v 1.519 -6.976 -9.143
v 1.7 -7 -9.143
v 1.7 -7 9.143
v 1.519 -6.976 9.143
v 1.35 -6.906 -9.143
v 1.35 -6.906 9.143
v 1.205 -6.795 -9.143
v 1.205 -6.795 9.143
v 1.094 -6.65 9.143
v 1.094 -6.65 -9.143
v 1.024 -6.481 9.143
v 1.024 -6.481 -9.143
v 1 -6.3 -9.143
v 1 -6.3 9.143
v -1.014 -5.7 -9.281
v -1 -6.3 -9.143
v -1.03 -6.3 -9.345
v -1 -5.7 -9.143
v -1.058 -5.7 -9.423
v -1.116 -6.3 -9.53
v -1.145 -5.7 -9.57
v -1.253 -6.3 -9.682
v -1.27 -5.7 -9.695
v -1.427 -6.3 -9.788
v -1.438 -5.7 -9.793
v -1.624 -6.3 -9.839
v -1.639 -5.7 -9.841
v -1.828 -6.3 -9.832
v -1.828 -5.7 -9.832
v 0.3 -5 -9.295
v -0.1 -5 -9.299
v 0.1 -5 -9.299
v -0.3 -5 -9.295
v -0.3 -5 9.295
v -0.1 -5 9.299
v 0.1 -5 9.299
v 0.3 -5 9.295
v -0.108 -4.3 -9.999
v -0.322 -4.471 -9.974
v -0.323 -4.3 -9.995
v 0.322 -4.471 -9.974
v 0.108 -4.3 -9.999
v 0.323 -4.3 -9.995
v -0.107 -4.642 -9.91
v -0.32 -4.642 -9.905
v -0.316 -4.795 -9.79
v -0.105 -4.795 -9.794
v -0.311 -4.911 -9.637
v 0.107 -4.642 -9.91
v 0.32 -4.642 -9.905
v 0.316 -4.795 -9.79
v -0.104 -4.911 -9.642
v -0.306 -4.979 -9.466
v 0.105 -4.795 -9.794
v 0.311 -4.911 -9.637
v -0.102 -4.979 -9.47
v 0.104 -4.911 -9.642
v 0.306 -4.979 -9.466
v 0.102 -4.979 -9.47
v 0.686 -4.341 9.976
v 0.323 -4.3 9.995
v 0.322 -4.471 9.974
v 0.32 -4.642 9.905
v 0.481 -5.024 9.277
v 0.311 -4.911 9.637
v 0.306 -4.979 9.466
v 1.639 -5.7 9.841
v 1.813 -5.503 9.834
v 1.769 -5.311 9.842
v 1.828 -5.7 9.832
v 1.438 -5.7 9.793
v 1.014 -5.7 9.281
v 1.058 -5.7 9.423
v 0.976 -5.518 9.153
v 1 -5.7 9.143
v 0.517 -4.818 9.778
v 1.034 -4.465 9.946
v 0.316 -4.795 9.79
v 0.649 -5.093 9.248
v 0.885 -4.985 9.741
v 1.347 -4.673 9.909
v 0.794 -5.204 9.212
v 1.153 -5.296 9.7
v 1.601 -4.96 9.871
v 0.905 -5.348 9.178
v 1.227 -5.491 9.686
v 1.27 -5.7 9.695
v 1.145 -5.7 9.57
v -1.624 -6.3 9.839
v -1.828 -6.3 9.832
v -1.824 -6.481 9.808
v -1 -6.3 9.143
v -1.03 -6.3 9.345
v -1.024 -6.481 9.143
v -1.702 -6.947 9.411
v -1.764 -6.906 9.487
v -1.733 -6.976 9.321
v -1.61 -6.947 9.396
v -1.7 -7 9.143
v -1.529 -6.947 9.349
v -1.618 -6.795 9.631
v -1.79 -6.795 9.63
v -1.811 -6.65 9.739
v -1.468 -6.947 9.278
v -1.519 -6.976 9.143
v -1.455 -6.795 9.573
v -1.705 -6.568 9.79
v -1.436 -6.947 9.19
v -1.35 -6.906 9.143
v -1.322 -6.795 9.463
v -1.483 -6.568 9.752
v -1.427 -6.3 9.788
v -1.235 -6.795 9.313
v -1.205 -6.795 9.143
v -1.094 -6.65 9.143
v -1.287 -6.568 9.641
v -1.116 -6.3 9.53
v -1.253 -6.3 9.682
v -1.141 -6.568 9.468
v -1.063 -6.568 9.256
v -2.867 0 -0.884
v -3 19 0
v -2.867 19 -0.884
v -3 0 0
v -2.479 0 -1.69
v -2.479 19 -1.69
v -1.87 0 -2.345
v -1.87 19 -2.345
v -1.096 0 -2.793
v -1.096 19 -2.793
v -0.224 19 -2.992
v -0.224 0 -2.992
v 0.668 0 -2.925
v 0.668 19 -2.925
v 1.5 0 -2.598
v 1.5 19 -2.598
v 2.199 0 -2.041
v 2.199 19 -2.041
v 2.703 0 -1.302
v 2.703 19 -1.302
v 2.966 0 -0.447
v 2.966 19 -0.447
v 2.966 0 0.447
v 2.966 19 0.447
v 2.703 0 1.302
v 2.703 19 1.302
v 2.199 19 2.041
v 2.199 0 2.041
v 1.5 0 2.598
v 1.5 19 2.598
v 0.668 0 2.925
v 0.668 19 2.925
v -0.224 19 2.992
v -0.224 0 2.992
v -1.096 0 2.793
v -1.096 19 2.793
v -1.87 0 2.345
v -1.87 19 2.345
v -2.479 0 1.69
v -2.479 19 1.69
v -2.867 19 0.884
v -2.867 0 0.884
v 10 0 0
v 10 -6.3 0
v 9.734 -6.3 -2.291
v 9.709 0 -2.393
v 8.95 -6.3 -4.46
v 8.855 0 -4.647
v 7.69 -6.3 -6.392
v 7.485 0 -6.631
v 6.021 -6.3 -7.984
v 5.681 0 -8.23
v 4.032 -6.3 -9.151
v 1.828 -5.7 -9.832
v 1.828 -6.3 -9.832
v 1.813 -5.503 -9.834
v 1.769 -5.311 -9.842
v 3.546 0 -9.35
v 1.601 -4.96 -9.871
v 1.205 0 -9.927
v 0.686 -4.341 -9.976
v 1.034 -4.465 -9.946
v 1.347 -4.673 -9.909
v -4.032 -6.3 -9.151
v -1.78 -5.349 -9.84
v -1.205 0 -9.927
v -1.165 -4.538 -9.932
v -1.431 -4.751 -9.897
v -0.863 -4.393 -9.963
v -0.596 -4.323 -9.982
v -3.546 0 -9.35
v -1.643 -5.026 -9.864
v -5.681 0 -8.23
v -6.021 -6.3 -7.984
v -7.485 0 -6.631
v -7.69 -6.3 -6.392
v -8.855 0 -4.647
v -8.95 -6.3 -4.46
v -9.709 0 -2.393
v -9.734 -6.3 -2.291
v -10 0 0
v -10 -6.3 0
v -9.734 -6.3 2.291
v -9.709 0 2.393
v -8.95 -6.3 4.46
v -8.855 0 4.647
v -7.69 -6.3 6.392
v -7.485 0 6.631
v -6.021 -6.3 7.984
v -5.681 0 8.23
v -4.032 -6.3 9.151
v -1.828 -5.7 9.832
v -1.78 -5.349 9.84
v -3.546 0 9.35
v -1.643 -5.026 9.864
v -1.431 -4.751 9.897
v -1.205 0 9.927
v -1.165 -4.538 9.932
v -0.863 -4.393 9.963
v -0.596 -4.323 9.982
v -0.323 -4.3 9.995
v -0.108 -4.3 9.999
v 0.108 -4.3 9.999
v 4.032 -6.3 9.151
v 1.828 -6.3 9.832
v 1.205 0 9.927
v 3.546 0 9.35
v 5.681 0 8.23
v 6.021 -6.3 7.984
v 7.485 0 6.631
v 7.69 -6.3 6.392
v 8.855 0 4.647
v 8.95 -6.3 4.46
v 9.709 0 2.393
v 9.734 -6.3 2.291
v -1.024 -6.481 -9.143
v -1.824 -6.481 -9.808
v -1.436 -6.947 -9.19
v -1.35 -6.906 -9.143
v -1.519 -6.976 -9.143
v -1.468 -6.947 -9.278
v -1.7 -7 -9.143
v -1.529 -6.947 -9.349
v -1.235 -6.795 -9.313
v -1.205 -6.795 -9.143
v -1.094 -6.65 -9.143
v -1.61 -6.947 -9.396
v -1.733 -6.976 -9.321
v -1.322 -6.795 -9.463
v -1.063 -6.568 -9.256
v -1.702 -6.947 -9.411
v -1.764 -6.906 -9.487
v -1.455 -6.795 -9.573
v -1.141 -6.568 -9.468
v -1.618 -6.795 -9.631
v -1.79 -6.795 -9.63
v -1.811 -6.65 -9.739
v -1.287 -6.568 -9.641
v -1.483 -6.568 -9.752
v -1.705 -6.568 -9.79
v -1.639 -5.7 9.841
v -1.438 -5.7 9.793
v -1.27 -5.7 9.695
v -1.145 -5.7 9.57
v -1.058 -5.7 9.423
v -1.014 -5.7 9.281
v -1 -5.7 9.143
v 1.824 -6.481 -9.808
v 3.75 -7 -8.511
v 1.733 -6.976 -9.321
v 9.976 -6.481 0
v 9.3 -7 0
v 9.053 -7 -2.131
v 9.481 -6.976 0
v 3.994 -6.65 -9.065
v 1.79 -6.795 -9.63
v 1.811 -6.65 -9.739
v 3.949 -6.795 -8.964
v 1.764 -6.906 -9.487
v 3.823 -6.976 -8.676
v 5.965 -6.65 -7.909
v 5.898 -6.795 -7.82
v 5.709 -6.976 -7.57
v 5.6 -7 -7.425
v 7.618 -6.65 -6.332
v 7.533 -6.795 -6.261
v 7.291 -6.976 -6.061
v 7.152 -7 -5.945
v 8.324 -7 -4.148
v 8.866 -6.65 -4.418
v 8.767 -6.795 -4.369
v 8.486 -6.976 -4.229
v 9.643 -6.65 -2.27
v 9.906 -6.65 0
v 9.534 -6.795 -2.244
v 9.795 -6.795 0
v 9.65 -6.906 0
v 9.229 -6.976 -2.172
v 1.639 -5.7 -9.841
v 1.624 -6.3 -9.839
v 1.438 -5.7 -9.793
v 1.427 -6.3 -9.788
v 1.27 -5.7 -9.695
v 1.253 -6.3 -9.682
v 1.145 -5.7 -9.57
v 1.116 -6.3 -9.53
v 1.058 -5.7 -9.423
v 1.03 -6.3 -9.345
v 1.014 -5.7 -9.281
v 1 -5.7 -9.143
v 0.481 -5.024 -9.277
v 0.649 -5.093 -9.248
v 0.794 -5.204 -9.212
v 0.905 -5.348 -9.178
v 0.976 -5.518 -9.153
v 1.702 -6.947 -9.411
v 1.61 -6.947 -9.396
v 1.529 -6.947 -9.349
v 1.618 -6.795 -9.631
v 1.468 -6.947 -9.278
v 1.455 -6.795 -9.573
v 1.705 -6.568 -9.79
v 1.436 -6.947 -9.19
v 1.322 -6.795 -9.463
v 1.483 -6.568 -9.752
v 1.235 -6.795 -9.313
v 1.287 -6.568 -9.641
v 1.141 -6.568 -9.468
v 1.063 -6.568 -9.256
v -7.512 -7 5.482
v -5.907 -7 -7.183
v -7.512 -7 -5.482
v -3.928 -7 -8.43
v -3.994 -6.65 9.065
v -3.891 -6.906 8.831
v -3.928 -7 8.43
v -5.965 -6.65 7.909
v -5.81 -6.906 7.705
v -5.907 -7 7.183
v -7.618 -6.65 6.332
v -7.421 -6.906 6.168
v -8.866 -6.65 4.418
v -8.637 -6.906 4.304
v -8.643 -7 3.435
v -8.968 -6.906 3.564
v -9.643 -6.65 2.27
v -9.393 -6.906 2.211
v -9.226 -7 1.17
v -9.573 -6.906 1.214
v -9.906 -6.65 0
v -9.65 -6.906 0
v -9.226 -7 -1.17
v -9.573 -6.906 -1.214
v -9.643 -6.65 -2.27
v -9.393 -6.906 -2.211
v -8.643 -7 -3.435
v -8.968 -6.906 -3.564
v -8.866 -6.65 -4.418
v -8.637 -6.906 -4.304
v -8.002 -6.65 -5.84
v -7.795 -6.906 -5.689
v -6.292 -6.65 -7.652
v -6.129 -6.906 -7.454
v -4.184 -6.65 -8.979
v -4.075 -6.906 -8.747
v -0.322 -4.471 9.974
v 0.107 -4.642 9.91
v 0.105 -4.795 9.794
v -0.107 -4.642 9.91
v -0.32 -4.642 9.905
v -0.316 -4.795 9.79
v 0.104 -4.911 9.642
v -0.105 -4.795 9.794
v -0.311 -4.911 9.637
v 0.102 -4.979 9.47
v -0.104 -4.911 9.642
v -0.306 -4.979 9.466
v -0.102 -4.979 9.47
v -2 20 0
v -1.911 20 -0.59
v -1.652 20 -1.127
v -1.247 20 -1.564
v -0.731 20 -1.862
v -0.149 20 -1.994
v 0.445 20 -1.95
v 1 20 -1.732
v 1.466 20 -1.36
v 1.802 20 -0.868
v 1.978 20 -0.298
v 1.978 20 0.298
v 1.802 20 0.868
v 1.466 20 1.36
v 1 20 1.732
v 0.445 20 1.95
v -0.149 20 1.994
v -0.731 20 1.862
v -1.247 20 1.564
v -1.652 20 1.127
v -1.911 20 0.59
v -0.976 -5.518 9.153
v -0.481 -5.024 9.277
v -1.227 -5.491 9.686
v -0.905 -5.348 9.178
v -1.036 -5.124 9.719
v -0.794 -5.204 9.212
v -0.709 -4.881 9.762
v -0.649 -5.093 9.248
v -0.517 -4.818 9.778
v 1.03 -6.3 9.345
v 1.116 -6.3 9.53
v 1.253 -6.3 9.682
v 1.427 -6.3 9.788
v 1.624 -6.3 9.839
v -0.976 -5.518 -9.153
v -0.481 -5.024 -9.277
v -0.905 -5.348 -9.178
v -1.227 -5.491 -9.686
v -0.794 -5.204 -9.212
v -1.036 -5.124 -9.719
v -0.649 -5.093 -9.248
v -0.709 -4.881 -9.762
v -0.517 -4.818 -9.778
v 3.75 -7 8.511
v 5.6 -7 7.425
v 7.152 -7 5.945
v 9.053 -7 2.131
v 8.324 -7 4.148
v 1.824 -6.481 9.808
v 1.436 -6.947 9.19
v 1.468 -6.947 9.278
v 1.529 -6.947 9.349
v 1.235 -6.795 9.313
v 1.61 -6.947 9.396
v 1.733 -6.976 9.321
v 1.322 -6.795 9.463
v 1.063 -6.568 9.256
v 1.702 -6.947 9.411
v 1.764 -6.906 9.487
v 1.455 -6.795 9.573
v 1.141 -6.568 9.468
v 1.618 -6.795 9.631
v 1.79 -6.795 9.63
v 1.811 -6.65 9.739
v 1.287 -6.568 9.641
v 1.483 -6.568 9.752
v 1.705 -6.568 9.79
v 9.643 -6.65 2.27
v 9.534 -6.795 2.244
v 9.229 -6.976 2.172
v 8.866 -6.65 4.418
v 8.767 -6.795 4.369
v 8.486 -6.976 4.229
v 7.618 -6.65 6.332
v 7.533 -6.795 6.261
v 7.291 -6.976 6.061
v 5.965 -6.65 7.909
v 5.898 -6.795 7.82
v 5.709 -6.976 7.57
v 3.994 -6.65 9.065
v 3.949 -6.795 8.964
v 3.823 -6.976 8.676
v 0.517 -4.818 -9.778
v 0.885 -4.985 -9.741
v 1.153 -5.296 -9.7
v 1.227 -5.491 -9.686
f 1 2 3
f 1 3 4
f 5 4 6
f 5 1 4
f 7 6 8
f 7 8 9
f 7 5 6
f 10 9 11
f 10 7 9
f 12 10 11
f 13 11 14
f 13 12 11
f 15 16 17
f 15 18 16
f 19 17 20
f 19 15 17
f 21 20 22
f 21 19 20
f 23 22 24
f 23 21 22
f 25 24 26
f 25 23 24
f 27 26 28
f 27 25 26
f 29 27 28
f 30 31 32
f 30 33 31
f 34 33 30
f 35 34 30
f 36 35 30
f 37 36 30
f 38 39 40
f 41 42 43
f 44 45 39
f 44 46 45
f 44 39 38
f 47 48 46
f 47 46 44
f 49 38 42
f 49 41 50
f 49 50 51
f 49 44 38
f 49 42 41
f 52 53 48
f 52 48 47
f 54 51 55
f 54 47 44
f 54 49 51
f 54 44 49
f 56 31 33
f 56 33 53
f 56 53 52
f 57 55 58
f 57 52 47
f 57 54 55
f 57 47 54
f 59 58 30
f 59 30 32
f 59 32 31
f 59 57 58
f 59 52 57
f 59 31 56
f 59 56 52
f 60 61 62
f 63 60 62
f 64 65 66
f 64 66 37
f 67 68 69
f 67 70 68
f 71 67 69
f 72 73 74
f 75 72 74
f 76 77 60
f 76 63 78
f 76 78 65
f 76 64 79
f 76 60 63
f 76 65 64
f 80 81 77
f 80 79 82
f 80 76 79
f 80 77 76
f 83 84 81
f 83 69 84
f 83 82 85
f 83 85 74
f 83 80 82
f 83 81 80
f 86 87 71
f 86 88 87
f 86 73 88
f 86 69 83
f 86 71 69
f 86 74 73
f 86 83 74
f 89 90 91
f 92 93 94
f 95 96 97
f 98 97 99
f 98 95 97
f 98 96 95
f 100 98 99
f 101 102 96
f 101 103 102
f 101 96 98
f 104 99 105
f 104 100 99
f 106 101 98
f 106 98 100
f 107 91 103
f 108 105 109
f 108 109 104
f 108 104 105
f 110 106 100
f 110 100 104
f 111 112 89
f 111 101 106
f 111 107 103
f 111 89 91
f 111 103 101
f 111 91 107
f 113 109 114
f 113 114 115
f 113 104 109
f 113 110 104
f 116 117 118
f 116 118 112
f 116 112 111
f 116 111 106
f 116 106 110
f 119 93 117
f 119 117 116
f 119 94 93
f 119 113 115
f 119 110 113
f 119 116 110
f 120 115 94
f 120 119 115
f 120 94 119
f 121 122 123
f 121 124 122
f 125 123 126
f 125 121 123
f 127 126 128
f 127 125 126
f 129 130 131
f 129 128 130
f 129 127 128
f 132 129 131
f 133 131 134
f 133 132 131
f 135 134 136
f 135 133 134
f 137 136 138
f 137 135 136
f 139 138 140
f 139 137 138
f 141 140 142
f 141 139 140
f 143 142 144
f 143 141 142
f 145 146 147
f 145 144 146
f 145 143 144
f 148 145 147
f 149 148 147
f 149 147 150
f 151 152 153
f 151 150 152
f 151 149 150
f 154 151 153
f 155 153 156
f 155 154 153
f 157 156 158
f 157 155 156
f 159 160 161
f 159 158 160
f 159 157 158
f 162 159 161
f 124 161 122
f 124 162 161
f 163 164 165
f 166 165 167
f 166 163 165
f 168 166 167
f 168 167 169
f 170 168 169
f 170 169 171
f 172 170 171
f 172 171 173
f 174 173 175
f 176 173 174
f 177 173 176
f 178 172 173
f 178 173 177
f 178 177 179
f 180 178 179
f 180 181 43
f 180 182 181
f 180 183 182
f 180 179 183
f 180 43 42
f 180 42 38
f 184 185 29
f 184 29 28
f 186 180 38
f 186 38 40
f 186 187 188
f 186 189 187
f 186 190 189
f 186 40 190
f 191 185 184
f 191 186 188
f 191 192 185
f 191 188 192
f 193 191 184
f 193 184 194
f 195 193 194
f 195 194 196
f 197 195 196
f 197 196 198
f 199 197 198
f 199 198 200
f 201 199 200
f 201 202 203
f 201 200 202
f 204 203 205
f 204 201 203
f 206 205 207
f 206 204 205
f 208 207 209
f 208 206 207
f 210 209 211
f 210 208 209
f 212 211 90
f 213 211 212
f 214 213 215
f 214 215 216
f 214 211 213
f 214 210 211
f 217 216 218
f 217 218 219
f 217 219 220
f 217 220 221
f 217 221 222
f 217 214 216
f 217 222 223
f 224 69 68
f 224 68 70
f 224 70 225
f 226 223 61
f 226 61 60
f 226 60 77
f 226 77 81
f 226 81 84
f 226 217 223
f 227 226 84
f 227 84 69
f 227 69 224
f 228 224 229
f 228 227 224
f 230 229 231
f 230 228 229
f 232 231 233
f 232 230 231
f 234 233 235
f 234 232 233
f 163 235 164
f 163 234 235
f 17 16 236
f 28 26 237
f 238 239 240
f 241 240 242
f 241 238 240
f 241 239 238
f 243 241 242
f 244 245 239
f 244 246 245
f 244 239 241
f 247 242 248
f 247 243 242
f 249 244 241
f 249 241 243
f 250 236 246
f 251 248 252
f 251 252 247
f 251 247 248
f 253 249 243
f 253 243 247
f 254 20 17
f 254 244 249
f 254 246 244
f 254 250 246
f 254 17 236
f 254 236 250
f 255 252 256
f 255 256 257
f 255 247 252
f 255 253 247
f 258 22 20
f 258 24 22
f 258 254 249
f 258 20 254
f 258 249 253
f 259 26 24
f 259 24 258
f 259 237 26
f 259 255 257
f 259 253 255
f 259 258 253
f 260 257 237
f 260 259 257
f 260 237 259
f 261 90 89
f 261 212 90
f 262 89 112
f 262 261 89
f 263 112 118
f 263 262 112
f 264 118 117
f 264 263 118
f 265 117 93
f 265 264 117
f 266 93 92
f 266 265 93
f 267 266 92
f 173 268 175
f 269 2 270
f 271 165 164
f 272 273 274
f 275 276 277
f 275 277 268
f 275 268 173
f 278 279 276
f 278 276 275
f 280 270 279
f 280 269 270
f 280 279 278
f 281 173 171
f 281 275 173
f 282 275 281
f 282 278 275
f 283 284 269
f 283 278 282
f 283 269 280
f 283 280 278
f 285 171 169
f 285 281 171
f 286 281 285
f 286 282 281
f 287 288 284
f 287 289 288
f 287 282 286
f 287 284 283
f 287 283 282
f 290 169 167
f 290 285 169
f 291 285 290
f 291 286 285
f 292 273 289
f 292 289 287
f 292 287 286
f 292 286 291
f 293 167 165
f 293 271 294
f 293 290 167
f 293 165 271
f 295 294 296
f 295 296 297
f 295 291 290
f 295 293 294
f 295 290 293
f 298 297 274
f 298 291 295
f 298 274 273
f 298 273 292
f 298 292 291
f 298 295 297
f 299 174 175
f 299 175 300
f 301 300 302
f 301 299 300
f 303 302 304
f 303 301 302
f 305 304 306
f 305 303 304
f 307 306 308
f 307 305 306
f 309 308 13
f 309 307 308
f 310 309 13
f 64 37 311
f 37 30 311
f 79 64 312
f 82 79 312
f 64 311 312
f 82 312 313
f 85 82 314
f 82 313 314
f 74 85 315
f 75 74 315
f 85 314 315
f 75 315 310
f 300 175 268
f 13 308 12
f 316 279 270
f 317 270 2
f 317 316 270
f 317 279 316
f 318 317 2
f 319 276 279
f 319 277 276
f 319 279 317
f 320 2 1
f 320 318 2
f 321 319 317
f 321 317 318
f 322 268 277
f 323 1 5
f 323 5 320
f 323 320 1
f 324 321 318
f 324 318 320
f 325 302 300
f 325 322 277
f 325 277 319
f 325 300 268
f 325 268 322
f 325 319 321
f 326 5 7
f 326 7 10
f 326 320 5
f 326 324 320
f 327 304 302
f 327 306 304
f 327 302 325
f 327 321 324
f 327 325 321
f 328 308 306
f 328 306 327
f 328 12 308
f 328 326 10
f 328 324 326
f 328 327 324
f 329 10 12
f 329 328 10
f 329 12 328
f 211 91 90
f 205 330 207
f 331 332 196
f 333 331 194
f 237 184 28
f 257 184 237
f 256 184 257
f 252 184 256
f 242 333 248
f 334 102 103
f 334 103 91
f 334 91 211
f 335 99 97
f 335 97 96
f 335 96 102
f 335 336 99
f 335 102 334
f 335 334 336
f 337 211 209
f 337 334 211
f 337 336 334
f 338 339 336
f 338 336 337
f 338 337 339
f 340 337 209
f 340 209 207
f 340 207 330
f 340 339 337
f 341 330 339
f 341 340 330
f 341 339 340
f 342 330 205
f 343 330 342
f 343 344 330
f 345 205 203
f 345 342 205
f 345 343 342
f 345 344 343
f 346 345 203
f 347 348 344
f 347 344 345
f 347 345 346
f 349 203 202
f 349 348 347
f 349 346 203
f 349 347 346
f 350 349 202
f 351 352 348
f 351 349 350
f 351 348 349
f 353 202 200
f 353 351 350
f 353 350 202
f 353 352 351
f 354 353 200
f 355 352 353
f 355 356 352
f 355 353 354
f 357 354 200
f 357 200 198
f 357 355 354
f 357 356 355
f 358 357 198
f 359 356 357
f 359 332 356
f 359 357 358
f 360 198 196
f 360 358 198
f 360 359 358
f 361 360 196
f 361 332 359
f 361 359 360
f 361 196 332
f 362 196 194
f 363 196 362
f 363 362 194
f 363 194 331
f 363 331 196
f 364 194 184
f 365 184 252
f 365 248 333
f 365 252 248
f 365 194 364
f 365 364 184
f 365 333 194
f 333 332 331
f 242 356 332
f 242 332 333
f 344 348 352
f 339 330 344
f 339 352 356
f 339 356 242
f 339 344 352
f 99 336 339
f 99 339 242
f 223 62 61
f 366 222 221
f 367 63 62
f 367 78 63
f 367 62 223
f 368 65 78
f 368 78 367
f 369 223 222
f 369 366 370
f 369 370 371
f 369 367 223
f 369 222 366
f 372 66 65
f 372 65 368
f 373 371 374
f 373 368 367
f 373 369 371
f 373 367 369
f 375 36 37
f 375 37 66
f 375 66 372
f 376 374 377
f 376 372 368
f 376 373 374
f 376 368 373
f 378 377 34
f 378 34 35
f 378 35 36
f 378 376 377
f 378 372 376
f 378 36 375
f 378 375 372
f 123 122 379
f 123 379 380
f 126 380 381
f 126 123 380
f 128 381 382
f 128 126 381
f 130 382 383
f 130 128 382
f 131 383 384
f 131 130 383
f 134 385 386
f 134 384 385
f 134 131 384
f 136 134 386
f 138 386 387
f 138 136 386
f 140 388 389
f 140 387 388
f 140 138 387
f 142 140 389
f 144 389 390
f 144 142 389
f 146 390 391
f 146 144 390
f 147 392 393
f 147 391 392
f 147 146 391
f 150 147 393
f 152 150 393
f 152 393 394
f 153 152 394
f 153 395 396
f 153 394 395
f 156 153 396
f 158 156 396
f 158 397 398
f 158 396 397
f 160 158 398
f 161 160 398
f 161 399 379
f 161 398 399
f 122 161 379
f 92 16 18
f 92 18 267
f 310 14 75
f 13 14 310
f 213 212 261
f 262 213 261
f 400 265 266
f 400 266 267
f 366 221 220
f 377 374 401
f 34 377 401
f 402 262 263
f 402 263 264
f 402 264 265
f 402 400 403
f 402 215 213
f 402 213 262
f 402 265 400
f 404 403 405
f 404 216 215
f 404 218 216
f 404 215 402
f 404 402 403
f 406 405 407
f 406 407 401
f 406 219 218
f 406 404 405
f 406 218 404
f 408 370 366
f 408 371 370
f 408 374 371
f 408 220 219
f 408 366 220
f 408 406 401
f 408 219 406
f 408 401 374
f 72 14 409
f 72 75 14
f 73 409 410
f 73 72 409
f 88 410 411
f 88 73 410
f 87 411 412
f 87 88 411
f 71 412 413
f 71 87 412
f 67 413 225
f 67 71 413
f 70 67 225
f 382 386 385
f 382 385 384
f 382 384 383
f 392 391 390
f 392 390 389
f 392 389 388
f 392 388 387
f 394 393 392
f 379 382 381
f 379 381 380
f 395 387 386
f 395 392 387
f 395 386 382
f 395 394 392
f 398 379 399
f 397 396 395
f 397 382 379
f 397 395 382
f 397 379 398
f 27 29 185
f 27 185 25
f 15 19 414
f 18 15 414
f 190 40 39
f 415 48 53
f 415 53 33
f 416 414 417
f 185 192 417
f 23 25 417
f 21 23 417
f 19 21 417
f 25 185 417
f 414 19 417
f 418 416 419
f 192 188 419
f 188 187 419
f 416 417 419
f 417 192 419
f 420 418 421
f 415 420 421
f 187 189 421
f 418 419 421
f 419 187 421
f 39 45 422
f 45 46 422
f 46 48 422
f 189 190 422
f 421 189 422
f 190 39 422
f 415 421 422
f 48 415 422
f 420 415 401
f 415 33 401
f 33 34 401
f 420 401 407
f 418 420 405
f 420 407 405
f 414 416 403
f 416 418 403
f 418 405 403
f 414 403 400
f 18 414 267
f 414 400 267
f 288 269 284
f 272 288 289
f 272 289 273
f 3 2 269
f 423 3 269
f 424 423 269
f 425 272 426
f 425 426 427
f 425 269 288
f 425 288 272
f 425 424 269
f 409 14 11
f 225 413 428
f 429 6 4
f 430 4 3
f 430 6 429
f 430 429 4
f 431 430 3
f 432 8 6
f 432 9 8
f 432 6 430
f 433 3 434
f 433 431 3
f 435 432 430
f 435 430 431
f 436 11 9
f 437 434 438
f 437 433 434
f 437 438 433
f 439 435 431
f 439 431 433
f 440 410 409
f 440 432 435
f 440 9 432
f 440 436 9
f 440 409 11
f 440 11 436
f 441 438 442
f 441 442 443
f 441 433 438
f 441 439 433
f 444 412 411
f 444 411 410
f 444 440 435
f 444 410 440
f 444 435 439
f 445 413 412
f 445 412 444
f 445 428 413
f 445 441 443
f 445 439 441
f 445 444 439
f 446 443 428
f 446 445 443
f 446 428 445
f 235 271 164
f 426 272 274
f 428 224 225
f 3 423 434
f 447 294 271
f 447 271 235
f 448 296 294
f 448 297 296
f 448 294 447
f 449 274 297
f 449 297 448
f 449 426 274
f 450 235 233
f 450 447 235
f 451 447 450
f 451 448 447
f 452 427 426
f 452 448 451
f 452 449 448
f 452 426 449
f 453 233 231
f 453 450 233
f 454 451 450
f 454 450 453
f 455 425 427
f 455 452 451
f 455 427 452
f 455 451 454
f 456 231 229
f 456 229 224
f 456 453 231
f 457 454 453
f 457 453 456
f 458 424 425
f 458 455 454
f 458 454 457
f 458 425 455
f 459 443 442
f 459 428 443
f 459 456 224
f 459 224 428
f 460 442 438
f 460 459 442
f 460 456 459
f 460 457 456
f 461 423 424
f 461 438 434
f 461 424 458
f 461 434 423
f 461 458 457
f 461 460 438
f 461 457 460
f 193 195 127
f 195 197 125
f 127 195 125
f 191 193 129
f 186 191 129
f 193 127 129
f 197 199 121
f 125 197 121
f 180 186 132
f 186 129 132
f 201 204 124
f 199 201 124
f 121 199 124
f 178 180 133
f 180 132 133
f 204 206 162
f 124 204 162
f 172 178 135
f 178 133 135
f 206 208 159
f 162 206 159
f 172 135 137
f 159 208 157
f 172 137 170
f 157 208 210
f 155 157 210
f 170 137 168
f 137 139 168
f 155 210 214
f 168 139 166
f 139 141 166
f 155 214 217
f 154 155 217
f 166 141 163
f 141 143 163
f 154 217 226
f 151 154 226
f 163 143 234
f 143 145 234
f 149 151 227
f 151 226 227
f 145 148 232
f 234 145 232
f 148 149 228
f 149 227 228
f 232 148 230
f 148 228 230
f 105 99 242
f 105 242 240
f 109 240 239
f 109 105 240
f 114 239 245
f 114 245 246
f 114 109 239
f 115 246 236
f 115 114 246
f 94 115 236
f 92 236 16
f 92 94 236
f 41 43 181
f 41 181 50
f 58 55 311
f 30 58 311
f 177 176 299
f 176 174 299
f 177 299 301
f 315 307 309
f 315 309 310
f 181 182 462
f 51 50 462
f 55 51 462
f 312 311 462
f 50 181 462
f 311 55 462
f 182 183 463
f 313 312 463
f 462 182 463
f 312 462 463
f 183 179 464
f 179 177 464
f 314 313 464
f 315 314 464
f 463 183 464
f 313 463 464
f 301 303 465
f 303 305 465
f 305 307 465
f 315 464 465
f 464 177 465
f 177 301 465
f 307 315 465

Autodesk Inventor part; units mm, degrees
ref_plane "YZ Plane" through (0, 0, 0) normal (1, 0, 0) x (0, 1, 0)
ref_plane "XZ Plane" through (0, 0, 0) normal (0, 1, 0) x (-1, 0, 0)
ref_plane "XY Plane" through (0, 0, 0) normal (0, 0, 1) x (1, 0, 0)
sketch "Sketch1" plane through (0, 0, 0) normal (0, 1, 0) x (-1, 0, 0)
  circle A0 centre (0, 0) radius 3
  dimension "d0" = 6
extrude "Extrusion1" add sketch "Sketch1" along normal blind 20
sketch "Sketch2" plane through (0, 0, 0) normal (0, -1, 0) x (1, 0, 0)
  circle A0 centre (0, 0) radius 10
  dimension "d3" = 20
extrude "Extrusion2" add sketch "Sketch2" along normal blind 7
chamfer "Chamfer1" distance 1 angle 45 1 edges at (3, 20, 0)
sketch "Sketch3" plane through (0, -7, 0) normal (0, -1, 0) x (1, 0, 0)
  line L0 (-1, 12.4438) -> (1, 12.4438)
  line L1 (1, 12.4438) -> (1, -12.4438)
  line L2 (1, -12.4438) -> (-1, -12.4438)
  line L3 (-1, -12.4438) -> (-1, 12.4438)
  line L4 (-1, 12.4438) -> (1, -12.4438) construction
  line L5 (1, 12.4438) -> (-1, -12.4438) construction
  point P0 (0, 0)
  dimension "d9" = 2
extrude "Extrusion3" cut sketch "Sketch3" against normal blind 2
fillet "Fillet1" radius 0.7 13 edges at (-10, -7, 0) (7.4162, -7, -6.7082) (7.4162, -7, 6.7082) (1, -7, 0) (1, -6, -9.9499) (1, -6, 9.9499) (1, -5, 0) (0, -5, -10) (0, -5, 10) (-1, -5, 0) (-1, -6, -9.9499) (-1, -6, 9.9499) (-1, -7, 0)
thread "Thread1" size "M6x1" class "6g" standard "ISO Metric profile" length 20
properties part number "M6x1 Feet" material "Stainless Steel"
